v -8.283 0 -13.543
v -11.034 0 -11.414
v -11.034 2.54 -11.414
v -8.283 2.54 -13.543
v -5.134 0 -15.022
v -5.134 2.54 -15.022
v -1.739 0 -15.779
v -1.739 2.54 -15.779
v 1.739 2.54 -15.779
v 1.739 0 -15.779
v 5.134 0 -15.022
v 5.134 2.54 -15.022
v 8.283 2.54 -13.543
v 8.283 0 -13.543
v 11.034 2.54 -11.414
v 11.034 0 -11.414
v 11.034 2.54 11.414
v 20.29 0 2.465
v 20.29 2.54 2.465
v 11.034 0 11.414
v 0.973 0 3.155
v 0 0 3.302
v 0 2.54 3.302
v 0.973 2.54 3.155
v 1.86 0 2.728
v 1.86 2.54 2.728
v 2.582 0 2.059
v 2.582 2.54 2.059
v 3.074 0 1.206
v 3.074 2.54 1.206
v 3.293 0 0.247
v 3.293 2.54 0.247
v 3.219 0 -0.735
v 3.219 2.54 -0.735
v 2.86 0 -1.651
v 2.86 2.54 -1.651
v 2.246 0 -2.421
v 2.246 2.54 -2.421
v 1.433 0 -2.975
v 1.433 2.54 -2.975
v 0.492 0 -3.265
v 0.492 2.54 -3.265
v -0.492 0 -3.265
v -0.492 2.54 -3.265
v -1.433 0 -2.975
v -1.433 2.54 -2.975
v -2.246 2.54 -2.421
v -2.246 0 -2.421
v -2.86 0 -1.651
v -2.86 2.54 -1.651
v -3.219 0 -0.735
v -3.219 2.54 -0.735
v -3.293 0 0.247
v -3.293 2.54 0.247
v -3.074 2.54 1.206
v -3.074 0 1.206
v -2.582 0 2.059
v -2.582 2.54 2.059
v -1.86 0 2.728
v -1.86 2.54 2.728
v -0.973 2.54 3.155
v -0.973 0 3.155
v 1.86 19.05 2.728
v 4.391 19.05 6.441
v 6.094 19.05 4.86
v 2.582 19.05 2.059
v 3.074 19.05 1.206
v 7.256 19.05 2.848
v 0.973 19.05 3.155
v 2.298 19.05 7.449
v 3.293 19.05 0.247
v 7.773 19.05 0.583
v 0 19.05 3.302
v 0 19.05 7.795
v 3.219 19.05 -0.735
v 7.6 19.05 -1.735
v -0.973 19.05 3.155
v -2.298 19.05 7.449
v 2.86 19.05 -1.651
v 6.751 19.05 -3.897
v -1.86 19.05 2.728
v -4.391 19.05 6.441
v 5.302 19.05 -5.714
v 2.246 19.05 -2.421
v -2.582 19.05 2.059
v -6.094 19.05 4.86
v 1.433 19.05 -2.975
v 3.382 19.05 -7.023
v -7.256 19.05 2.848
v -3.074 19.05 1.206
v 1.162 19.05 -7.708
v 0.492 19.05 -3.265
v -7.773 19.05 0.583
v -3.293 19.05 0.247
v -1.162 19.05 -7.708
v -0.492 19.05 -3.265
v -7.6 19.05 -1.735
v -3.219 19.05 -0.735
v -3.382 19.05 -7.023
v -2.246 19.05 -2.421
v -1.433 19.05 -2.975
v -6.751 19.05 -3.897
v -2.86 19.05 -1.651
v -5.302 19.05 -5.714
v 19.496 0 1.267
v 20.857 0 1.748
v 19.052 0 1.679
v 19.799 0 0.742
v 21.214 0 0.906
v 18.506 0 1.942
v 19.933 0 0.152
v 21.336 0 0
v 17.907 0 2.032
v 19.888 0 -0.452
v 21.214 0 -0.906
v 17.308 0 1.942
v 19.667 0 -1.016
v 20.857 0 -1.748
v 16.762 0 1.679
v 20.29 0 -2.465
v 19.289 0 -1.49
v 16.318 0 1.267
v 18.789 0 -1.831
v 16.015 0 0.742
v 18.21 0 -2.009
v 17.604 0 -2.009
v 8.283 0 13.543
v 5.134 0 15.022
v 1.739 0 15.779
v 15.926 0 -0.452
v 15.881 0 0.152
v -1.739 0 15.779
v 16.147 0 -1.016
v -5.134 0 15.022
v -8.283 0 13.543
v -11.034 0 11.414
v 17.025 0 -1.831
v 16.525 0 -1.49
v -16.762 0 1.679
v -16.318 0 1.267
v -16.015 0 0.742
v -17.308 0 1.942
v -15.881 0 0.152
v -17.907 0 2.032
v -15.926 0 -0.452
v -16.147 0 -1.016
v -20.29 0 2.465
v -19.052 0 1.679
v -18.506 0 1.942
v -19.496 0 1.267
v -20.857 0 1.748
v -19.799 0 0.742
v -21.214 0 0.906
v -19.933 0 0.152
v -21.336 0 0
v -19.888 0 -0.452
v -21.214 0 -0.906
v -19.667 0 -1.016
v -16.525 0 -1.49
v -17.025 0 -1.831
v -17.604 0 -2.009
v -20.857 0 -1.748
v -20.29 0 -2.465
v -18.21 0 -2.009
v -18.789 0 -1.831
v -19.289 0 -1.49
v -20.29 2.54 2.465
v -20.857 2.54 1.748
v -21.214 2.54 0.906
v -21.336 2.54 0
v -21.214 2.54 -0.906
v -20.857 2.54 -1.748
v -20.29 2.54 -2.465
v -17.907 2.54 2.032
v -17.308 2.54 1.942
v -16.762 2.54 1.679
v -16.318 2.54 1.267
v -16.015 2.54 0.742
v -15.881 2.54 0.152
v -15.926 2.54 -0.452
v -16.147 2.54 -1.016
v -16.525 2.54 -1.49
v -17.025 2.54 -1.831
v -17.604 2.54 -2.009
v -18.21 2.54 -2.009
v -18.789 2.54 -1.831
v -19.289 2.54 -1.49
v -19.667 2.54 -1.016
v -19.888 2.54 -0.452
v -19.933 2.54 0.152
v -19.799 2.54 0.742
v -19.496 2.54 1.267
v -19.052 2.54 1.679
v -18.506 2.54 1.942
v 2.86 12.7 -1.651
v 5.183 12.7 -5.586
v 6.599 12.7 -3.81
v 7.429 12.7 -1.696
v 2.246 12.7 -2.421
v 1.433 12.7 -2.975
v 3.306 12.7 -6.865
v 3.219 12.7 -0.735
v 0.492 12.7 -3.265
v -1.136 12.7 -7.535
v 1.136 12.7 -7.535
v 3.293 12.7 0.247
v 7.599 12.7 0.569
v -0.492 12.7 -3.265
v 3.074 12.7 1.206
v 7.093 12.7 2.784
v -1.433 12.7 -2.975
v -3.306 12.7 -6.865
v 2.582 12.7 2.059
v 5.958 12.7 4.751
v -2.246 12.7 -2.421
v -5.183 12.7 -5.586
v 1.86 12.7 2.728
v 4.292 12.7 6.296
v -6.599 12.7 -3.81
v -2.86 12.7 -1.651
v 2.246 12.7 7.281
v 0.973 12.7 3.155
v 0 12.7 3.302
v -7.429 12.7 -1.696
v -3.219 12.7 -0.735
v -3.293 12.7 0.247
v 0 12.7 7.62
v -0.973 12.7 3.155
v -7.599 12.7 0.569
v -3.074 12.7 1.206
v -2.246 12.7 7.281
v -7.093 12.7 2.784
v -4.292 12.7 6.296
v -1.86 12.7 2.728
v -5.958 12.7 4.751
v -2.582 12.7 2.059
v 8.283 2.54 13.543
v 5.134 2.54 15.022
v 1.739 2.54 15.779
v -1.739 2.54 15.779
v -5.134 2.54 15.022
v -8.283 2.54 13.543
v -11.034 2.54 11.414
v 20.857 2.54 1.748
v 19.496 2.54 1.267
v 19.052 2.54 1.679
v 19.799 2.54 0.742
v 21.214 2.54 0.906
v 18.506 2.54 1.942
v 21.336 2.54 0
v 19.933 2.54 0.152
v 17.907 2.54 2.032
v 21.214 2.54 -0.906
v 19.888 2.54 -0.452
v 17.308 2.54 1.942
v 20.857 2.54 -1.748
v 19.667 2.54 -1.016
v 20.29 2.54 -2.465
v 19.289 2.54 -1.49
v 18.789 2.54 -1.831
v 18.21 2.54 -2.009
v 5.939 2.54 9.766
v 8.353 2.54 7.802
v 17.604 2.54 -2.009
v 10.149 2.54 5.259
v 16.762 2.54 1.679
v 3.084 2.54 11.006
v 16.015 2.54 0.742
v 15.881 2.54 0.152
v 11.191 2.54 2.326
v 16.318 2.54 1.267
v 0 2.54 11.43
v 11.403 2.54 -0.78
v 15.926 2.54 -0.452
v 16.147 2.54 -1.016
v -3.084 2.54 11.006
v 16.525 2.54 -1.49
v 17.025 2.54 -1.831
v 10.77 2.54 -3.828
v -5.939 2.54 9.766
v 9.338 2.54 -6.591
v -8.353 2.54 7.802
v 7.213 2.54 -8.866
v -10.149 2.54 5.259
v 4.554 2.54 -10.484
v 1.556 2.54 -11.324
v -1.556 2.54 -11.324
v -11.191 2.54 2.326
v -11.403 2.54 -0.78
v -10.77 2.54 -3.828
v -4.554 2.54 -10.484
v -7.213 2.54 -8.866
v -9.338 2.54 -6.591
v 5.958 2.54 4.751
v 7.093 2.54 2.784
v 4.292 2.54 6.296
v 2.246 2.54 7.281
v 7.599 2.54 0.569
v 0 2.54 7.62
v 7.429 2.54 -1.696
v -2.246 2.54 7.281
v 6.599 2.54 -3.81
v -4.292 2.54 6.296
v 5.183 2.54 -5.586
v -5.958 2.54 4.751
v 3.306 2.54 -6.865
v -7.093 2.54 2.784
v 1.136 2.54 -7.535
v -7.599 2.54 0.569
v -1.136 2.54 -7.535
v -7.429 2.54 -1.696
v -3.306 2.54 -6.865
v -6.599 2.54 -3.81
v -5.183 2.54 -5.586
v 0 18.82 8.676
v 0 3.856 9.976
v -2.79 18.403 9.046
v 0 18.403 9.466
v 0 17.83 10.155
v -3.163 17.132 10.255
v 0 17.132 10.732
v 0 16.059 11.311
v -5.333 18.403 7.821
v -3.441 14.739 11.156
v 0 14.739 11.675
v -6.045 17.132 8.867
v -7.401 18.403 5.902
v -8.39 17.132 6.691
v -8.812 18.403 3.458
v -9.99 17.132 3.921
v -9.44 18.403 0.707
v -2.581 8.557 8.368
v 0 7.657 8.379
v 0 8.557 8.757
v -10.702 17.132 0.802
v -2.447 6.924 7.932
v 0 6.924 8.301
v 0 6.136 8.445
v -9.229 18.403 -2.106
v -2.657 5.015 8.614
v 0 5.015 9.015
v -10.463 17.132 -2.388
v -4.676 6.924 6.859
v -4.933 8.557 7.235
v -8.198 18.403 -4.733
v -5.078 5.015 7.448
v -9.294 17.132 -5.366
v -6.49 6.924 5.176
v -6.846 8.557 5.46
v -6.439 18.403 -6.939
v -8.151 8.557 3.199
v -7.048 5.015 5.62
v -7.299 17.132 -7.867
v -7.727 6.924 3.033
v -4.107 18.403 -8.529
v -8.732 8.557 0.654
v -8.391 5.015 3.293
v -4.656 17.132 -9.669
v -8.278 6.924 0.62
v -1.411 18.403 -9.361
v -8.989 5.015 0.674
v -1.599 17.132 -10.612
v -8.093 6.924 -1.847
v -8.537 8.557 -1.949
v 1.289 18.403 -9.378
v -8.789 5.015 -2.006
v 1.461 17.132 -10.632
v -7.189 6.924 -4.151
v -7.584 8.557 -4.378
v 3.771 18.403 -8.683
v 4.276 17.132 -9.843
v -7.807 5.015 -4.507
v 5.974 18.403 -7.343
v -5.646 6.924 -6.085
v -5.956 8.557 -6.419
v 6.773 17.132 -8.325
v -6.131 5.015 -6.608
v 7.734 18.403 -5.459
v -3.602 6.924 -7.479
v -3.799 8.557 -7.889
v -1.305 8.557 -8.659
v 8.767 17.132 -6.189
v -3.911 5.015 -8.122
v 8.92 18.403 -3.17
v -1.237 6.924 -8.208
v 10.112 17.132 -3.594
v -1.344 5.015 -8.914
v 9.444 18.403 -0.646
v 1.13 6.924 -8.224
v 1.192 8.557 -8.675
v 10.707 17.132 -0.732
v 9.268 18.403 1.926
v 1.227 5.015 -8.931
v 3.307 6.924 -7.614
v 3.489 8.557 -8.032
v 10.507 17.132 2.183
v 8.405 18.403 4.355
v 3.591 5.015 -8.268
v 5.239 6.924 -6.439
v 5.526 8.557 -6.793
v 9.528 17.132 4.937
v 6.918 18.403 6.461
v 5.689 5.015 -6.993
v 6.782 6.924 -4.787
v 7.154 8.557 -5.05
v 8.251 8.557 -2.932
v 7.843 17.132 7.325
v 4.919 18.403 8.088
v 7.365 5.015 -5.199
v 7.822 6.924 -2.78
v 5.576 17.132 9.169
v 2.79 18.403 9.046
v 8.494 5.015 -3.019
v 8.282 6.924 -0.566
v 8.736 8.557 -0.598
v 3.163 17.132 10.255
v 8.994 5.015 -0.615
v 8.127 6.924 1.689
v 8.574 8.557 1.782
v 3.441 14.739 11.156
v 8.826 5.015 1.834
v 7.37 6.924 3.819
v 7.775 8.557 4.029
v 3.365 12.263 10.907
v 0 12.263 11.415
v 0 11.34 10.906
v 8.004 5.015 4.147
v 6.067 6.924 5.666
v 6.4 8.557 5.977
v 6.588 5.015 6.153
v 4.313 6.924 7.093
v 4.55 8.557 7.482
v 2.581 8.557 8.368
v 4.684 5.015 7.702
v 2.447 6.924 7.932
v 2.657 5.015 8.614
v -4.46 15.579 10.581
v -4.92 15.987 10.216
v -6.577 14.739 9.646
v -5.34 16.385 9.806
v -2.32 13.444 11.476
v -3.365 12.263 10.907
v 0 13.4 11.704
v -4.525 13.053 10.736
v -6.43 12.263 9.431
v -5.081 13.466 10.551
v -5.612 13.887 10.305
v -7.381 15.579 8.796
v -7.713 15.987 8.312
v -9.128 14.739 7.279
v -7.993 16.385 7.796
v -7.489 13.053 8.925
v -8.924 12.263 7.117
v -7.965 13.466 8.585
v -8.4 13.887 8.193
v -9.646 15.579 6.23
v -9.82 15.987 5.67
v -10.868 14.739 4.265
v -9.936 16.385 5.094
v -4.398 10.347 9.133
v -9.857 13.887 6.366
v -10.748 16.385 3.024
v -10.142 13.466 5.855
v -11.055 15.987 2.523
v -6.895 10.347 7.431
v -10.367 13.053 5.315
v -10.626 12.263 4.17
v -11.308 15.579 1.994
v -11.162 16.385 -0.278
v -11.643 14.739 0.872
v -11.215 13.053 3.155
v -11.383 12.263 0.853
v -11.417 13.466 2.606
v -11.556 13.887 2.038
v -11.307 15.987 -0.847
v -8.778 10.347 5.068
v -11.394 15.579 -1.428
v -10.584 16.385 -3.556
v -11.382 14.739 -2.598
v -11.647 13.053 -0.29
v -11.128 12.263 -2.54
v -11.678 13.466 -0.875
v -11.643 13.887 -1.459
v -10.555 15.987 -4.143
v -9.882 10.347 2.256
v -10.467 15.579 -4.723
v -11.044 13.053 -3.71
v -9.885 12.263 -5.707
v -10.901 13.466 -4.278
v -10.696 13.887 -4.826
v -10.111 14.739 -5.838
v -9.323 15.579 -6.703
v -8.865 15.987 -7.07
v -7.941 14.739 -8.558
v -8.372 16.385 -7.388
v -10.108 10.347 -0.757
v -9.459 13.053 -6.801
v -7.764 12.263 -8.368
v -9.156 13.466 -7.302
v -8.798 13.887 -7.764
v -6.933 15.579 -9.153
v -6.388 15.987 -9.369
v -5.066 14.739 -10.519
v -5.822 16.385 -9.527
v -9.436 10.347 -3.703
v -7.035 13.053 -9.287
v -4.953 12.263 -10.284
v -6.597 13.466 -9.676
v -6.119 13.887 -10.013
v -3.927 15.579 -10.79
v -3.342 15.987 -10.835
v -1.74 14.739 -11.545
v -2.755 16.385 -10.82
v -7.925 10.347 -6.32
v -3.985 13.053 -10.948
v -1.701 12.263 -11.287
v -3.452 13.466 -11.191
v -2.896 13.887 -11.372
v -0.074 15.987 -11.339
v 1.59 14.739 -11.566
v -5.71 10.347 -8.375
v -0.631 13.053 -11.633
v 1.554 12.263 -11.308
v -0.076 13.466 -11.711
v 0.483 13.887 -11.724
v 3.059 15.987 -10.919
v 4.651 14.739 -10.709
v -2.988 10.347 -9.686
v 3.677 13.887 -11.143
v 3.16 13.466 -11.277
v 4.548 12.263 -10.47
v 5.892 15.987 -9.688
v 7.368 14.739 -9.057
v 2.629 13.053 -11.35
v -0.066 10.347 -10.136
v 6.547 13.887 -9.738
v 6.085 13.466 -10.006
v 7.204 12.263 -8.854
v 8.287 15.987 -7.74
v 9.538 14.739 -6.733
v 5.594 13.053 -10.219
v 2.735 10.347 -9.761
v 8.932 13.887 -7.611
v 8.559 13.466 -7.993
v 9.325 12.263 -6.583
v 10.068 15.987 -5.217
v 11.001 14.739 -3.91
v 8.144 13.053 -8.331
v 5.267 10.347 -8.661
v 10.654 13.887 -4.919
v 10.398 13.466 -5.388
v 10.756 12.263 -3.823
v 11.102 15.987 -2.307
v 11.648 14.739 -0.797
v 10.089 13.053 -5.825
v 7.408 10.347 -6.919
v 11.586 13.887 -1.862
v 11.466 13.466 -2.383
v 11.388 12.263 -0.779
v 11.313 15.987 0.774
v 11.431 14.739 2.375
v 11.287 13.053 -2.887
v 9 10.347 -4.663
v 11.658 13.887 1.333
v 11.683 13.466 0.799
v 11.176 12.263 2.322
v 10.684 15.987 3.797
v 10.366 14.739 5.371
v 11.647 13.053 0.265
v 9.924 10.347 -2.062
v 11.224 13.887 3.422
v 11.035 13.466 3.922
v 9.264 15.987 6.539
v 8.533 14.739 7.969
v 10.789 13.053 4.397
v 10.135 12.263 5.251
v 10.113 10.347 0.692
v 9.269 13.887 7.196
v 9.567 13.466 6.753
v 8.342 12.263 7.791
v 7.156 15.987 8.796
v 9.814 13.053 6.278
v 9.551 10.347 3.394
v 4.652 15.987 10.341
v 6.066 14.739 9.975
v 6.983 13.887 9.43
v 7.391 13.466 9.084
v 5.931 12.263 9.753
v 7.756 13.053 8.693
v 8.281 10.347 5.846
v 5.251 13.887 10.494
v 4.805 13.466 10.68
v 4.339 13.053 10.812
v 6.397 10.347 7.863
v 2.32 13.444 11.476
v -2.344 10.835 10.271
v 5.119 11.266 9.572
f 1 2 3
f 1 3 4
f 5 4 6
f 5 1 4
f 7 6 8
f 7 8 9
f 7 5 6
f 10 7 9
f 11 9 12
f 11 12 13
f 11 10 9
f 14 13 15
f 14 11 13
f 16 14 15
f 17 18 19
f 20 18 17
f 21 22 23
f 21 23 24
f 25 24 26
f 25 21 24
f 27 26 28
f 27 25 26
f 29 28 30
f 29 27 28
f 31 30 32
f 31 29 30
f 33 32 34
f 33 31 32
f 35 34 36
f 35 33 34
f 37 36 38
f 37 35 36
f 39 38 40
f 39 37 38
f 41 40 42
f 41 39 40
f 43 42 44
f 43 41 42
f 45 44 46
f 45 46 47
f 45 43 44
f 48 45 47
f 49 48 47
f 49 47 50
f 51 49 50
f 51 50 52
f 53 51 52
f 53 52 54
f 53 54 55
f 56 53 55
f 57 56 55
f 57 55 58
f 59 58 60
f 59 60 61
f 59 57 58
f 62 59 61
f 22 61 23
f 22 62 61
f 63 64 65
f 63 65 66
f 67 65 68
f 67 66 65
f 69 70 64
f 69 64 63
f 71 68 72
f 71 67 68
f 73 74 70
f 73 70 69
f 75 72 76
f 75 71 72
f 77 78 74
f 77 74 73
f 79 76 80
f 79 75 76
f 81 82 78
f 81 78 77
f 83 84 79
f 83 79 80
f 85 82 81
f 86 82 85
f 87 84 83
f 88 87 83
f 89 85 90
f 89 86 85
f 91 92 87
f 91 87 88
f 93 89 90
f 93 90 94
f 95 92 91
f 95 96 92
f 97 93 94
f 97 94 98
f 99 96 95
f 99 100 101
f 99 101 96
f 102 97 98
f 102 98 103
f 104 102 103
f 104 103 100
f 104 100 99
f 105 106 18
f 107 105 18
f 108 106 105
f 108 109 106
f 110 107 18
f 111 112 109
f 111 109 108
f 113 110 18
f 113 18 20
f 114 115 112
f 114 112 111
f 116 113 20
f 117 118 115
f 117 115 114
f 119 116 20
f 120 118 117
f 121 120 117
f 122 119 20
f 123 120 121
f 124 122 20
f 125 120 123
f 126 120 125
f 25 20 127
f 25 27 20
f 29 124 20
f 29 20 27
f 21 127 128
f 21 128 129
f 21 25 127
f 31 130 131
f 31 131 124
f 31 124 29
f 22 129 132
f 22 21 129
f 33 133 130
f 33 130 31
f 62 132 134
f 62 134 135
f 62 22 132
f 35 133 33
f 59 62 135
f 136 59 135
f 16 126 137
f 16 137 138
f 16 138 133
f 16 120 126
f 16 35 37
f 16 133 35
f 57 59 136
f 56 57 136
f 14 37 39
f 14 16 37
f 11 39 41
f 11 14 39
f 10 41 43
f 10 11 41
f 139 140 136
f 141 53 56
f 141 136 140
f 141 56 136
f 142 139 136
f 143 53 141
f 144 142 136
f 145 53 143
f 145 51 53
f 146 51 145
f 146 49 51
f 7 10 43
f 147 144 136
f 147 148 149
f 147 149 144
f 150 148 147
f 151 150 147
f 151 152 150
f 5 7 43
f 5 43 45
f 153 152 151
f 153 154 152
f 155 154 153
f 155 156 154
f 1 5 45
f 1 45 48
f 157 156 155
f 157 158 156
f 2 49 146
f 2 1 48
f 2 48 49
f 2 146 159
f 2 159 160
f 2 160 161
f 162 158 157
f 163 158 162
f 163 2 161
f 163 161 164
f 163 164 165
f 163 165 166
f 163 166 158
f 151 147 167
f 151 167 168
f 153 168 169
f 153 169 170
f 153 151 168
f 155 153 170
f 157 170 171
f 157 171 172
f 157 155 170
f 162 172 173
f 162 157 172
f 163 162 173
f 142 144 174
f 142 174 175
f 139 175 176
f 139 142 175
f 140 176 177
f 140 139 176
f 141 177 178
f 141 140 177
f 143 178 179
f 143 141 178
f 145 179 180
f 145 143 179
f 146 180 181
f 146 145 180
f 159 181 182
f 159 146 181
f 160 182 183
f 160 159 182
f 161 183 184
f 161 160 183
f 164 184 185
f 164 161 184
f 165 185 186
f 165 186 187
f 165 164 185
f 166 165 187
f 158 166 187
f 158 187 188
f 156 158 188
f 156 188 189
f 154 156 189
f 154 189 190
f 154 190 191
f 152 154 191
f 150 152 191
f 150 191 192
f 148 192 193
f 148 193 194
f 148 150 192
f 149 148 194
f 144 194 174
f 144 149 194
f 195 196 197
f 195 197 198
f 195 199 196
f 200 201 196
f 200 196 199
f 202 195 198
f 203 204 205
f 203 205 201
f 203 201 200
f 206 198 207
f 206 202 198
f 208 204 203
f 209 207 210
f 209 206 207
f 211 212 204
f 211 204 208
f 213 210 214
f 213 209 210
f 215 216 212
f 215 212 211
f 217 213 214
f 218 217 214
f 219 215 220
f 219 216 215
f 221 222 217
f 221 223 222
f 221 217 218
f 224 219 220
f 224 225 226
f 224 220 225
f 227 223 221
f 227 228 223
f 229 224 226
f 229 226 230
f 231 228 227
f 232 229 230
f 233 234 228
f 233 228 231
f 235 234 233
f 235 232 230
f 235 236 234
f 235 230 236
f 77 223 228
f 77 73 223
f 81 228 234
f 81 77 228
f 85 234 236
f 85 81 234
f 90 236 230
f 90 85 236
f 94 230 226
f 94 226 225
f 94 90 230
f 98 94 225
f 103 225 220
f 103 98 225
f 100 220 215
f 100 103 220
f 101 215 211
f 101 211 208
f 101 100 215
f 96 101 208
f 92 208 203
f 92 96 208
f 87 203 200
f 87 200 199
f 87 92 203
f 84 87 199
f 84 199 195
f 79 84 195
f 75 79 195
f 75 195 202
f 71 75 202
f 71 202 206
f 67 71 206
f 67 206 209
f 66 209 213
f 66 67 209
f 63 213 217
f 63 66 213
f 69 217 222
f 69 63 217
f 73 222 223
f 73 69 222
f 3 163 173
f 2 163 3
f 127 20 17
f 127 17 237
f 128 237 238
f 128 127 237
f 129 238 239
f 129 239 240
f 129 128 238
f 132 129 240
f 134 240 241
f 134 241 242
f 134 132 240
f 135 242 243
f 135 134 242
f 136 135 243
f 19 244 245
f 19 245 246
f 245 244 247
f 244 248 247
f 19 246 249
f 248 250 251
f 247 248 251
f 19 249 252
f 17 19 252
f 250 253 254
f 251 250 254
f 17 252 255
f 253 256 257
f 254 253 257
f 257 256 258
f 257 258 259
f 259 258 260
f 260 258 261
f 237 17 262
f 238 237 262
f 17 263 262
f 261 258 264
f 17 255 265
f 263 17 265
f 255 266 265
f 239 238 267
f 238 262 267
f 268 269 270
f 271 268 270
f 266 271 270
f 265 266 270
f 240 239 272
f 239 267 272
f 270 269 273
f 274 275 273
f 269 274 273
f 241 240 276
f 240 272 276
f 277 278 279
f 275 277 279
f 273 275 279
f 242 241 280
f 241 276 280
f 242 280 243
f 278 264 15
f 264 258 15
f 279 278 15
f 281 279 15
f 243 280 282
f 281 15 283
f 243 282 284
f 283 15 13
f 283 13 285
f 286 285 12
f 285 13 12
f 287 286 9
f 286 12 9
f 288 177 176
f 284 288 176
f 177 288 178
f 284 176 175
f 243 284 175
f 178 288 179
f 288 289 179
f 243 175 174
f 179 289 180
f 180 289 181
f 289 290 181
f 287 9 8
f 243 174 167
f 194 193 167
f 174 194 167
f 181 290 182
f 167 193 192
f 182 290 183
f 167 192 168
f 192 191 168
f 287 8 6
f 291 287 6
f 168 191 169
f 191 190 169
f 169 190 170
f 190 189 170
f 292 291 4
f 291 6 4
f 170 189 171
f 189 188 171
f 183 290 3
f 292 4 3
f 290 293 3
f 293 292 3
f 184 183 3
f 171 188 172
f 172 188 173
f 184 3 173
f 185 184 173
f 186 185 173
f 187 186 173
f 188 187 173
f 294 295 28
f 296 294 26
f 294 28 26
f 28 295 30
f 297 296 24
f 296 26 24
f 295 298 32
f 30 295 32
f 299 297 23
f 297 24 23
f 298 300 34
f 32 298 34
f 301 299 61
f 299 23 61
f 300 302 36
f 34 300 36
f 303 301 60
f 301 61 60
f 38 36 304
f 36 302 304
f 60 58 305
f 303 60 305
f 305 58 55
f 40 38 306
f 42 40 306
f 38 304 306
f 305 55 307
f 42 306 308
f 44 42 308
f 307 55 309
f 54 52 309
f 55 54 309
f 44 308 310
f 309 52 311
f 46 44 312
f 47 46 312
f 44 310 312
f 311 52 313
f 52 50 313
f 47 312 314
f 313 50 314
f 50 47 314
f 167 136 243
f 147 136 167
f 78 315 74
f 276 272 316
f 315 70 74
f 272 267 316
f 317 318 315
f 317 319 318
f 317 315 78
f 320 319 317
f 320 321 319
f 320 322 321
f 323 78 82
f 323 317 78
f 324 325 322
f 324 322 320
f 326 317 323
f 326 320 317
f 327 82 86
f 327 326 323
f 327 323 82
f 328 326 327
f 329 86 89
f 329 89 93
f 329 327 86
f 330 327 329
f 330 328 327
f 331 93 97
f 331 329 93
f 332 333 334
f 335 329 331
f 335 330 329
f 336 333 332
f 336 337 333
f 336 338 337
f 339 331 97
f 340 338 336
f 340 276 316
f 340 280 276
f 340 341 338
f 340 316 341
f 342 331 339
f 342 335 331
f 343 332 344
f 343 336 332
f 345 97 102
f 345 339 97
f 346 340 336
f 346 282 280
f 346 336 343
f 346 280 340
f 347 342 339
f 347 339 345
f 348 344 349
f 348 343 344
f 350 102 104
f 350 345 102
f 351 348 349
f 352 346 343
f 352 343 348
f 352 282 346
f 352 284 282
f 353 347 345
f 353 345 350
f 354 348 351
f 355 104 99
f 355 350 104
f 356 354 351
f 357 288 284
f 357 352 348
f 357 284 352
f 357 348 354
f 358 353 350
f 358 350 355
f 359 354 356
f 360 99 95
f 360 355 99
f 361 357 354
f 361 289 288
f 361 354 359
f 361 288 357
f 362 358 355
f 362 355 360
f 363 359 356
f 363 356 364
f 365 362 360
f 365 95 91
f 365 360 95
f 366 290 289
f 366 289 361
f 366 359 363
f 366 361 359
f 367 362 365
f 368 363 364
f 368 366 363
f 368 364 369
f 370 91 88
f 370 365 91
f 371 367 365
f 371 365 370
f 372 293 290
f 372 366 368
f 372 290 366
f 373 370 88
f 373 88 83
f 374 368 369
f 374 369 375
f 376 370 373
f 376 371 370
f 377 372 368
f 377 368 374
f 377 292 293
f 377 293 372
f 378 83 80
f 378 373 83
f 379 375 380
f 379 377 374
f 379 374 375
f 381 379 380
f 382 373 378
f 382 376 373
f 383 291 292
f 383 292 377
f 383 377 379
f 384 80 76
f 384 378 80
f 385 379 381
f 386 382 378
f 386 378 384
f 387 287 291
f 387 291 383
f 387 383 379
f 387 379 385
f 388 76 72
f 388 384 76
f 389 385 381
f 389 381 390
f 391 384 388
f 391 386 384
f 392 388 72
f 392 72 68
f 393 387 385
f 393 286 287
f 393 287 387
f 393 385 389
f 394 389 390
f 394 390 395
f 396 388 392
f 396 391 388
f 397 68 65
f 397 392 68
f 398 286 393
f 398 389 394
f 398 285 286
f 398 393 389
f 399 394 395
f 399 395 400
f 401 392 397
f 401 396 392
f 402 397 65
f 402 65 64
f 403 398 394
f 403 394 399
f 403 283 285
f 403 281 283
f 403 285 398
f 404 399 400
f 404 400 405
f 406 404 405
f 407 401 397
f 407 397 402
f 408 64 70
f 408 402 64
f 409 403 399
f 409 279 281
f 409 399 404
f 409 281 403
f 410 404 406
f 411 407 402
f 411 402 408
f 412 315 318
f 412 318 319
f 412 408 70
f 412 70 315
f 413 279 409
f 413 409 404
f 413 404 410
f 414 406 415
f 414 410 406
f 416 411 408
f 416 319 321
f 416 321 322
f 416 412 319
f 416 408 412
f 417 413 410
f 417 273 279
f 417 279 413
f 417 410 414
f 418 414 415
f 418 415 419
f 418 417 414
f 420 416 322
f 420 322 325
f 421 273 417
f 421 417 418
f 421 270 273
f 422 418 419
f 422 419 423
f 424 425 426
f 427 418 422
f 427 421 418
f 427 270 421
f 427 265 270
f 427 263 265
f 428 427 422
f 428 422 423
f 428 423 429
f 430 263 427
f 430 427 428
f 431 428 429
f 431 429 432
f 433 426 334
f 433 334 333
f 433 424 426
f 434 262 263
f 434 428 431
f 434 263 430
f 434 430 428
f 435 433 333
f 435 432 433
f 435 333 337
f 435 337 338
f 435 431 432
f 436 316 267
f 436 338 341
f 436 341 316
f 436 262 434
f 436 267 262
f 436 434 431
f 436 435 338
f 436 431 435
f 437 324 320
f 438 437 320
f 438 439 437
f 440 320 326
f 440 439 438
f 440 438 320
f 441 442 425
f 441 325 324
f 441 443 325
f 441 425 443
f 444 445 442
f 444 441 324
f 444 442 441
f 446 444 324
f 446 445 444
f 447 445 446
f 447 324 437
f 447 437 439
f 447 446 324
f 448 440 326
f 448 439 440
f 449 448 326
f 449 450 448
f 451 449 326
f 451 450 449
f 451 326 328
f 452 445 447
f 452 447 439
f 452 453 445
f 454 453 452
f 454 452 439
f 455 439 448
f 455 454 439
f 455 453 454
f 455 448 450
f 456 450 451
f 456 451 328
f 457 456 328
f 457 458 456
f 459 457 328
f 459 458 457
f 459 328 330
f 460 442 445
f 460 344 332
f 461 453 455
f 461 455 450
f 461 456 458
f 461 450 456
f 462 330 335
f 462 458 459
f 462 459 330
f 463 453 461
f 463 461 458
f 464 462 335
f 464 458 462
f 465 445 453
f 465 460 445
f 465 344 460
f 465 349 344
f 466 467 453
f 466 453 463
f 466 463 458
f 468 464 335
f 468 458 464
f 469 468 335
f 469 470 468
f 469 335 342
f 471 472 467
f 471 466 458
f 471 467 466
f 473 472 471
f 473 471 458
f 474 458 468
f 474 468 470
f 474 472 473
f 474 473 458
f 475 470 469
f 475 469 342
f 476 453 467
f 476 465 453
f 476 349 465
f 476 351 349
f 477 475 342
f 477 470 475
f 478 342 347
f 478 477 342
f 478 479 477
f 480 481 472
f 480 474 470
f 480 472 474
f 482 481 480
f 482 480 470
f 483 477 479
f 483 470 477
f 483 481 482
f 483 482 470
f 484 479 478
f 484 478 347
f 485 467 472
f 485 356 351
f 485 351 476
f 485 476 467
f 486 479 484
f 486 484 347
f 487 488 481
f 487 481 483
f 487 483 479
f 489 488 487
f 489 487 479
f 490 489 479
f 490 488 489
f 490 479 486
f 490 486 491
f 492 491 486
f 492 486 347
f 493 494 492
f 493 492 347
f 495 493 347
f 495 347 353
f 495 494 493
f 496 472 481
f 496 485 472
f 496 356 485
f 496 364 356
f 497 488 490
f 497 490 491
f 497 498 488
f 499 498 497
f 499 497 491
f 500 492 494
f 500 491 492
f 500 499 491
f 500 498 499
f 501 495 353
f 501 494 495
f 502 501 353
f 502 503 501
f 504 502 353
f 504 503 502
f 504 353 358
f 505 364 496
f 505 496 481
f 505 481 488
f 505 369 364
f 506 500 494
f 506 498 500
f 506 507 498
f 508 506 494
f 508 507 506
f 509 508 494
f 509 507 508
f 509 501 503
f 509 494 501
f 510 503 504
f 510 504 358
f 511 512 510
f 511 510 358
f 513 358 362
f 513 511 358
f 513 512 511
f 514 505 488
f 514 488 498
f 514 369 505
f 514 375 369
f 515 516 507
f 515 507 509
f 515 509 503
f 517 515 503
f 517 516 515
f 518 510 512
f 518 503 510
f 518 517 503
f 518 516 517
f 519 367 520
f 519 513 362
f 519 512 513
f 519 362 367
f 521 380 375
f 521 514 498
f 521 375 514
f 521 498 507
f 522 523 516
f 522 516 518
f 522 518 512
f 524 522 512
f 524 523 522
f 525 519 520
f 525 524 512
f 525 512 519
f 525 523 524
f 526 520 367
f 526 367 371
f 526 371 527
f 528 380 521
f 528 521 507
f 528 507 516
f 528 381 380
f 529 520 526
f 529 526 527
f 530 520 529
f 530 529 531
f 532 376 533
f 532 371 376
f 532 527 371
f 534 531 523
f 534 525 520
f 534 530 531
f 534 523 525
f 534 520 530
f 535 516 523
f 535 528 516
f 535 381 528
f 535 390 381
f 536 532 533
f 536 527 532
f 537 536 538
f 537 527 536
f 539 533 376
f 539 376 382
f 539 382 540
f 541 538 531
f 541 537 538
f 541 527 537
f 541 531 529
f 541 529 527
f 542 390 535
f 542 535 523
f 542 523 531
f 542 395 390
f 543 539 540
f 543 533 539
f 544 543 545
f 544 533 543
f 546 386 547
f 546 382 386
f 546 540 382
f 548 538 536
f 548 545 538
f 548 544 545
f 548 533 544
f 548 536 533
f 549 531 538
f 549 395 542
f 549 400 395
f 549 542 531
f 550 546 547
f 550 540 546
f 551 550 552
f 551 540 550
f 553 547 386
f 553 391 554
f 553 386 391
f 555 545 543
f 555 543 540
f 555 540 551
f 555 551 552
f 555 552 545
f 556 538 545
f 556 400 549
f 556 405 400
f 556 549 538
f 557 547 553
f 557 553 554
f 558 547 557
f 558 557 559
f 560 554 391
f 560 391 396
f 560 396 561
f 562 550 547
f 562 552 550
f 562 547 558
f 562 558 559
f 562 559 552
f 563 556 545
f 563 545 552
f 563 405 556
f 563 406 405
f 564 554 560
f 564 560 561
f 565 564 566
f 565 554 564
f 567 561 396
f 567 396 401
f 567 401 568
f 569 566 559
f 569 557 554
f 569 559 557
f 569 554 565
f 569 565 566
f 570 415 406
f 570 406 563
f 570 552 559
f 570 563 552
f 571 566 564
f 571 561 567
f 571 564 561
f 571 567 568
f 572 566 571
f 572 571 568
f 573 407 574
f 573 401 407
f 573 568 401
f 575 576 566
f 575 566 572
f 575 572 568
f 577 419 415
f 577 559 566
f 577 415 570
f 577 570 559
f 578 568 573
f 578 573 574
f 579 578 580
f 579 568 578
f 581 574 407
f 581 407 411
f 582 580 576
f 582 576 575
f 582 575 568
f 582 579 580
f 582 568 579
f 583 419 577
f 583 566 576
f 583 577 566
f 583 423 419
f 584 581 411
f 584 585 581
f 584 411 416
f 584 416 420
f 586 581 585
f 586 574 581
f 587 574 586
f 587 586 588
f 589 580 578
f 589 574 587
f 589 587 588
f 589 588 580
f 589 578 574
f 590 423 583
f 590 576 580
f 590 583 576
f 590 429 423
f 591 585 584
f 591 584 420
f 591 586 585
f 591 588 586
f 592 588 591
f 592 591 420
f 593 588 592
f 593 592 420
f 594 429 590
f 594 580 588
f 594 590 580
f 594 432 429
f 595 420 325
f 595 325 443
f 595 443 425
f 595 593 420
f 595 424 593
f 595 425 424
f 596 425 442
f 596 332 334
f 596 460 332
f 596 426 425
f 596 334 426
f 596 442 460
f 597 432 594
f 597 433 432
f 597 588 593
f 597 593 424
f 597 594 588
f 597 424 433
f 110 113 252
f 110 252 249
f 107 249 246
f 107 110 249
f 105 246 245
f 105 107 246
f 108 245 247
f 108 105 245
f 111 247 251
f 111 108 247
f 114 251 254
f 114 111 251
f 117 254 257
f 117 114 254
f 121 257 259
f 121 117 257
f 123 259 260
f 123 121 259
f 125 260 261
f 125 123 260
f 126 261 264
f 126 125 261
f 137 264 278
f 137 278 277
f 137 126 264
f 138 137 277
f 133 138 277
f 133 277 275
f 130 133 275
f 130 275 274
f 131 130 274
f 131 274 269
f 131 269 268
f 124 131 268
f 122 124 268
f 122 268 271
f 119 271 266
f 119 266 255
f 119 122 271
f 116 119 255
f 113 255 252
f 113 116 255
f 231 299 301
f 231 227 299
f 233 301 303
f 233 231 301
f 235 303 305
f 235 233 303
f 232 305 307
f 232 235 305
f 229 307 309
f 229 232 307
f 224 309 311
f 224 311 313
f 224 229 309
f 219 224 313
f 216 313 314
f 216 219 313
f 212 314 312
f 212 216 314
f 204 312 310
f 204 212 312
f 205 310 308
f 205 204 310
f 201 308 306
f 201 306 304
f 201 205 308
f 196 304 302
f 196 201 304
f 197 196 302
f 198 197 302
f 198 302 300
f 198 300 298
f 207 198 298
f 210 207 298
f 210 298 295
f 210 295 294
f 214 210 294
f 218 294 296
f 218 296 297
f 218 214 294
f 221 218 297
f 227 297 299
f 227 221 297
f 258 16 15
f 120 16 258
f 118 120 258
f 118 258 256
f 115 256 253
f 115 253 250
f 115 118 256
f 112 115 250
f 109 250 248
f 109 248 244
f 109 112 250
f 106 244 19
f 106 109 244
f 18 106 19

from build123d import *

# Parameters (mm, degrees)
SKETCH1_R           = 2.032
SKETCH1_R_2         = 3.302
BOSS_EXTRUDE1_DEPTH = 2.54


with BuildPart() as part:
    # Sketch1 → Boss-Extrude1 (new body)
    with BuildSketch(Plane(origin=(0, 0, 0), x_dir=(1, 0, 0), z_dir=(0, 1, 0))):
        with BuildLine():
            Line((-20.290276596, 2.465366843), (-11.033687943, 11.413735382))
            ThreePointArc((-11.033687943, 11.413735382), (0, 15.875), (11.033687943, 11.413735382))
            Line((11.033687943, 11.413735382), (20.290276596, 2.465366843))
            ThreePointArc((20.290276596, 2.465366843), (21.336, 0), (20.290276596, -2.465366843))
            Line((20.290276596, -2.465366843), (11.033687943, -11.413735382))
            ThreePointArc((11.033687943, -11.413735382), (0, -15.875), (-11.033687943, -11.413735382))
            Line((-11.033687943, -11.413735382), (-20.290276596, -2.465366843))
            ThreePointArc((-20.290276596, -2.465366843), (-21.336, 0), (-20.290276596, 2.465366843))
        make_face()
        with Locations(Location((-17.907, 0, 0), (0, 0, 270))):
            Circle(SKETCH1_R, mode=Mode.SUBTRACT)
        with Locations(Location((17.907, 0, 0), (0, 0, 270))):
            Circle(SKETCH1_R, mode=Mode.SUBTRACT)
        with Locations(Location((0, 0, 0), (0, 0, 270))):
            Circle(SKETCH1_R_2, mode=Mode.SUBTRACT)
    extrude(amount=BOSS_EXTRUDE1_DEPTH)

    # Sketch3 → Revolve1 (revolve)
    with BuildSketch(Plane(origin=(0, 0, 0), x_dir=(0, 0, -1), z_dir=(1, 0, 0))):
        with BuildLine():
            Line((-3.302, 19.05), (-7.794998012, 19.05))
            add(Edge.make_bspline(
                [(-7.794998012, 19.05), (-10.740596789, 18.645101439), (-14.519445993, 10.395857778), (-5.018498512, 7.761963643), (-11.43, 2.54)],
                knots=[0, 0, 0, 0, 0.449937677, 1, 1, 1, 1], degree=3))
            Line((-11.43, 2.54), (-7.62, 2.54))
            Line((-7.62, 2.54), (-7.62, 12.7))
            Line((-7.62, 12.7), (-3.302, 12.7))
            Line((-3.302, 12.7), (-3.302, 19.05))
        make_face()
    revolve(axis=Axis((0, 19.05, 0), (0, -1, 0)))


solid = part.part
